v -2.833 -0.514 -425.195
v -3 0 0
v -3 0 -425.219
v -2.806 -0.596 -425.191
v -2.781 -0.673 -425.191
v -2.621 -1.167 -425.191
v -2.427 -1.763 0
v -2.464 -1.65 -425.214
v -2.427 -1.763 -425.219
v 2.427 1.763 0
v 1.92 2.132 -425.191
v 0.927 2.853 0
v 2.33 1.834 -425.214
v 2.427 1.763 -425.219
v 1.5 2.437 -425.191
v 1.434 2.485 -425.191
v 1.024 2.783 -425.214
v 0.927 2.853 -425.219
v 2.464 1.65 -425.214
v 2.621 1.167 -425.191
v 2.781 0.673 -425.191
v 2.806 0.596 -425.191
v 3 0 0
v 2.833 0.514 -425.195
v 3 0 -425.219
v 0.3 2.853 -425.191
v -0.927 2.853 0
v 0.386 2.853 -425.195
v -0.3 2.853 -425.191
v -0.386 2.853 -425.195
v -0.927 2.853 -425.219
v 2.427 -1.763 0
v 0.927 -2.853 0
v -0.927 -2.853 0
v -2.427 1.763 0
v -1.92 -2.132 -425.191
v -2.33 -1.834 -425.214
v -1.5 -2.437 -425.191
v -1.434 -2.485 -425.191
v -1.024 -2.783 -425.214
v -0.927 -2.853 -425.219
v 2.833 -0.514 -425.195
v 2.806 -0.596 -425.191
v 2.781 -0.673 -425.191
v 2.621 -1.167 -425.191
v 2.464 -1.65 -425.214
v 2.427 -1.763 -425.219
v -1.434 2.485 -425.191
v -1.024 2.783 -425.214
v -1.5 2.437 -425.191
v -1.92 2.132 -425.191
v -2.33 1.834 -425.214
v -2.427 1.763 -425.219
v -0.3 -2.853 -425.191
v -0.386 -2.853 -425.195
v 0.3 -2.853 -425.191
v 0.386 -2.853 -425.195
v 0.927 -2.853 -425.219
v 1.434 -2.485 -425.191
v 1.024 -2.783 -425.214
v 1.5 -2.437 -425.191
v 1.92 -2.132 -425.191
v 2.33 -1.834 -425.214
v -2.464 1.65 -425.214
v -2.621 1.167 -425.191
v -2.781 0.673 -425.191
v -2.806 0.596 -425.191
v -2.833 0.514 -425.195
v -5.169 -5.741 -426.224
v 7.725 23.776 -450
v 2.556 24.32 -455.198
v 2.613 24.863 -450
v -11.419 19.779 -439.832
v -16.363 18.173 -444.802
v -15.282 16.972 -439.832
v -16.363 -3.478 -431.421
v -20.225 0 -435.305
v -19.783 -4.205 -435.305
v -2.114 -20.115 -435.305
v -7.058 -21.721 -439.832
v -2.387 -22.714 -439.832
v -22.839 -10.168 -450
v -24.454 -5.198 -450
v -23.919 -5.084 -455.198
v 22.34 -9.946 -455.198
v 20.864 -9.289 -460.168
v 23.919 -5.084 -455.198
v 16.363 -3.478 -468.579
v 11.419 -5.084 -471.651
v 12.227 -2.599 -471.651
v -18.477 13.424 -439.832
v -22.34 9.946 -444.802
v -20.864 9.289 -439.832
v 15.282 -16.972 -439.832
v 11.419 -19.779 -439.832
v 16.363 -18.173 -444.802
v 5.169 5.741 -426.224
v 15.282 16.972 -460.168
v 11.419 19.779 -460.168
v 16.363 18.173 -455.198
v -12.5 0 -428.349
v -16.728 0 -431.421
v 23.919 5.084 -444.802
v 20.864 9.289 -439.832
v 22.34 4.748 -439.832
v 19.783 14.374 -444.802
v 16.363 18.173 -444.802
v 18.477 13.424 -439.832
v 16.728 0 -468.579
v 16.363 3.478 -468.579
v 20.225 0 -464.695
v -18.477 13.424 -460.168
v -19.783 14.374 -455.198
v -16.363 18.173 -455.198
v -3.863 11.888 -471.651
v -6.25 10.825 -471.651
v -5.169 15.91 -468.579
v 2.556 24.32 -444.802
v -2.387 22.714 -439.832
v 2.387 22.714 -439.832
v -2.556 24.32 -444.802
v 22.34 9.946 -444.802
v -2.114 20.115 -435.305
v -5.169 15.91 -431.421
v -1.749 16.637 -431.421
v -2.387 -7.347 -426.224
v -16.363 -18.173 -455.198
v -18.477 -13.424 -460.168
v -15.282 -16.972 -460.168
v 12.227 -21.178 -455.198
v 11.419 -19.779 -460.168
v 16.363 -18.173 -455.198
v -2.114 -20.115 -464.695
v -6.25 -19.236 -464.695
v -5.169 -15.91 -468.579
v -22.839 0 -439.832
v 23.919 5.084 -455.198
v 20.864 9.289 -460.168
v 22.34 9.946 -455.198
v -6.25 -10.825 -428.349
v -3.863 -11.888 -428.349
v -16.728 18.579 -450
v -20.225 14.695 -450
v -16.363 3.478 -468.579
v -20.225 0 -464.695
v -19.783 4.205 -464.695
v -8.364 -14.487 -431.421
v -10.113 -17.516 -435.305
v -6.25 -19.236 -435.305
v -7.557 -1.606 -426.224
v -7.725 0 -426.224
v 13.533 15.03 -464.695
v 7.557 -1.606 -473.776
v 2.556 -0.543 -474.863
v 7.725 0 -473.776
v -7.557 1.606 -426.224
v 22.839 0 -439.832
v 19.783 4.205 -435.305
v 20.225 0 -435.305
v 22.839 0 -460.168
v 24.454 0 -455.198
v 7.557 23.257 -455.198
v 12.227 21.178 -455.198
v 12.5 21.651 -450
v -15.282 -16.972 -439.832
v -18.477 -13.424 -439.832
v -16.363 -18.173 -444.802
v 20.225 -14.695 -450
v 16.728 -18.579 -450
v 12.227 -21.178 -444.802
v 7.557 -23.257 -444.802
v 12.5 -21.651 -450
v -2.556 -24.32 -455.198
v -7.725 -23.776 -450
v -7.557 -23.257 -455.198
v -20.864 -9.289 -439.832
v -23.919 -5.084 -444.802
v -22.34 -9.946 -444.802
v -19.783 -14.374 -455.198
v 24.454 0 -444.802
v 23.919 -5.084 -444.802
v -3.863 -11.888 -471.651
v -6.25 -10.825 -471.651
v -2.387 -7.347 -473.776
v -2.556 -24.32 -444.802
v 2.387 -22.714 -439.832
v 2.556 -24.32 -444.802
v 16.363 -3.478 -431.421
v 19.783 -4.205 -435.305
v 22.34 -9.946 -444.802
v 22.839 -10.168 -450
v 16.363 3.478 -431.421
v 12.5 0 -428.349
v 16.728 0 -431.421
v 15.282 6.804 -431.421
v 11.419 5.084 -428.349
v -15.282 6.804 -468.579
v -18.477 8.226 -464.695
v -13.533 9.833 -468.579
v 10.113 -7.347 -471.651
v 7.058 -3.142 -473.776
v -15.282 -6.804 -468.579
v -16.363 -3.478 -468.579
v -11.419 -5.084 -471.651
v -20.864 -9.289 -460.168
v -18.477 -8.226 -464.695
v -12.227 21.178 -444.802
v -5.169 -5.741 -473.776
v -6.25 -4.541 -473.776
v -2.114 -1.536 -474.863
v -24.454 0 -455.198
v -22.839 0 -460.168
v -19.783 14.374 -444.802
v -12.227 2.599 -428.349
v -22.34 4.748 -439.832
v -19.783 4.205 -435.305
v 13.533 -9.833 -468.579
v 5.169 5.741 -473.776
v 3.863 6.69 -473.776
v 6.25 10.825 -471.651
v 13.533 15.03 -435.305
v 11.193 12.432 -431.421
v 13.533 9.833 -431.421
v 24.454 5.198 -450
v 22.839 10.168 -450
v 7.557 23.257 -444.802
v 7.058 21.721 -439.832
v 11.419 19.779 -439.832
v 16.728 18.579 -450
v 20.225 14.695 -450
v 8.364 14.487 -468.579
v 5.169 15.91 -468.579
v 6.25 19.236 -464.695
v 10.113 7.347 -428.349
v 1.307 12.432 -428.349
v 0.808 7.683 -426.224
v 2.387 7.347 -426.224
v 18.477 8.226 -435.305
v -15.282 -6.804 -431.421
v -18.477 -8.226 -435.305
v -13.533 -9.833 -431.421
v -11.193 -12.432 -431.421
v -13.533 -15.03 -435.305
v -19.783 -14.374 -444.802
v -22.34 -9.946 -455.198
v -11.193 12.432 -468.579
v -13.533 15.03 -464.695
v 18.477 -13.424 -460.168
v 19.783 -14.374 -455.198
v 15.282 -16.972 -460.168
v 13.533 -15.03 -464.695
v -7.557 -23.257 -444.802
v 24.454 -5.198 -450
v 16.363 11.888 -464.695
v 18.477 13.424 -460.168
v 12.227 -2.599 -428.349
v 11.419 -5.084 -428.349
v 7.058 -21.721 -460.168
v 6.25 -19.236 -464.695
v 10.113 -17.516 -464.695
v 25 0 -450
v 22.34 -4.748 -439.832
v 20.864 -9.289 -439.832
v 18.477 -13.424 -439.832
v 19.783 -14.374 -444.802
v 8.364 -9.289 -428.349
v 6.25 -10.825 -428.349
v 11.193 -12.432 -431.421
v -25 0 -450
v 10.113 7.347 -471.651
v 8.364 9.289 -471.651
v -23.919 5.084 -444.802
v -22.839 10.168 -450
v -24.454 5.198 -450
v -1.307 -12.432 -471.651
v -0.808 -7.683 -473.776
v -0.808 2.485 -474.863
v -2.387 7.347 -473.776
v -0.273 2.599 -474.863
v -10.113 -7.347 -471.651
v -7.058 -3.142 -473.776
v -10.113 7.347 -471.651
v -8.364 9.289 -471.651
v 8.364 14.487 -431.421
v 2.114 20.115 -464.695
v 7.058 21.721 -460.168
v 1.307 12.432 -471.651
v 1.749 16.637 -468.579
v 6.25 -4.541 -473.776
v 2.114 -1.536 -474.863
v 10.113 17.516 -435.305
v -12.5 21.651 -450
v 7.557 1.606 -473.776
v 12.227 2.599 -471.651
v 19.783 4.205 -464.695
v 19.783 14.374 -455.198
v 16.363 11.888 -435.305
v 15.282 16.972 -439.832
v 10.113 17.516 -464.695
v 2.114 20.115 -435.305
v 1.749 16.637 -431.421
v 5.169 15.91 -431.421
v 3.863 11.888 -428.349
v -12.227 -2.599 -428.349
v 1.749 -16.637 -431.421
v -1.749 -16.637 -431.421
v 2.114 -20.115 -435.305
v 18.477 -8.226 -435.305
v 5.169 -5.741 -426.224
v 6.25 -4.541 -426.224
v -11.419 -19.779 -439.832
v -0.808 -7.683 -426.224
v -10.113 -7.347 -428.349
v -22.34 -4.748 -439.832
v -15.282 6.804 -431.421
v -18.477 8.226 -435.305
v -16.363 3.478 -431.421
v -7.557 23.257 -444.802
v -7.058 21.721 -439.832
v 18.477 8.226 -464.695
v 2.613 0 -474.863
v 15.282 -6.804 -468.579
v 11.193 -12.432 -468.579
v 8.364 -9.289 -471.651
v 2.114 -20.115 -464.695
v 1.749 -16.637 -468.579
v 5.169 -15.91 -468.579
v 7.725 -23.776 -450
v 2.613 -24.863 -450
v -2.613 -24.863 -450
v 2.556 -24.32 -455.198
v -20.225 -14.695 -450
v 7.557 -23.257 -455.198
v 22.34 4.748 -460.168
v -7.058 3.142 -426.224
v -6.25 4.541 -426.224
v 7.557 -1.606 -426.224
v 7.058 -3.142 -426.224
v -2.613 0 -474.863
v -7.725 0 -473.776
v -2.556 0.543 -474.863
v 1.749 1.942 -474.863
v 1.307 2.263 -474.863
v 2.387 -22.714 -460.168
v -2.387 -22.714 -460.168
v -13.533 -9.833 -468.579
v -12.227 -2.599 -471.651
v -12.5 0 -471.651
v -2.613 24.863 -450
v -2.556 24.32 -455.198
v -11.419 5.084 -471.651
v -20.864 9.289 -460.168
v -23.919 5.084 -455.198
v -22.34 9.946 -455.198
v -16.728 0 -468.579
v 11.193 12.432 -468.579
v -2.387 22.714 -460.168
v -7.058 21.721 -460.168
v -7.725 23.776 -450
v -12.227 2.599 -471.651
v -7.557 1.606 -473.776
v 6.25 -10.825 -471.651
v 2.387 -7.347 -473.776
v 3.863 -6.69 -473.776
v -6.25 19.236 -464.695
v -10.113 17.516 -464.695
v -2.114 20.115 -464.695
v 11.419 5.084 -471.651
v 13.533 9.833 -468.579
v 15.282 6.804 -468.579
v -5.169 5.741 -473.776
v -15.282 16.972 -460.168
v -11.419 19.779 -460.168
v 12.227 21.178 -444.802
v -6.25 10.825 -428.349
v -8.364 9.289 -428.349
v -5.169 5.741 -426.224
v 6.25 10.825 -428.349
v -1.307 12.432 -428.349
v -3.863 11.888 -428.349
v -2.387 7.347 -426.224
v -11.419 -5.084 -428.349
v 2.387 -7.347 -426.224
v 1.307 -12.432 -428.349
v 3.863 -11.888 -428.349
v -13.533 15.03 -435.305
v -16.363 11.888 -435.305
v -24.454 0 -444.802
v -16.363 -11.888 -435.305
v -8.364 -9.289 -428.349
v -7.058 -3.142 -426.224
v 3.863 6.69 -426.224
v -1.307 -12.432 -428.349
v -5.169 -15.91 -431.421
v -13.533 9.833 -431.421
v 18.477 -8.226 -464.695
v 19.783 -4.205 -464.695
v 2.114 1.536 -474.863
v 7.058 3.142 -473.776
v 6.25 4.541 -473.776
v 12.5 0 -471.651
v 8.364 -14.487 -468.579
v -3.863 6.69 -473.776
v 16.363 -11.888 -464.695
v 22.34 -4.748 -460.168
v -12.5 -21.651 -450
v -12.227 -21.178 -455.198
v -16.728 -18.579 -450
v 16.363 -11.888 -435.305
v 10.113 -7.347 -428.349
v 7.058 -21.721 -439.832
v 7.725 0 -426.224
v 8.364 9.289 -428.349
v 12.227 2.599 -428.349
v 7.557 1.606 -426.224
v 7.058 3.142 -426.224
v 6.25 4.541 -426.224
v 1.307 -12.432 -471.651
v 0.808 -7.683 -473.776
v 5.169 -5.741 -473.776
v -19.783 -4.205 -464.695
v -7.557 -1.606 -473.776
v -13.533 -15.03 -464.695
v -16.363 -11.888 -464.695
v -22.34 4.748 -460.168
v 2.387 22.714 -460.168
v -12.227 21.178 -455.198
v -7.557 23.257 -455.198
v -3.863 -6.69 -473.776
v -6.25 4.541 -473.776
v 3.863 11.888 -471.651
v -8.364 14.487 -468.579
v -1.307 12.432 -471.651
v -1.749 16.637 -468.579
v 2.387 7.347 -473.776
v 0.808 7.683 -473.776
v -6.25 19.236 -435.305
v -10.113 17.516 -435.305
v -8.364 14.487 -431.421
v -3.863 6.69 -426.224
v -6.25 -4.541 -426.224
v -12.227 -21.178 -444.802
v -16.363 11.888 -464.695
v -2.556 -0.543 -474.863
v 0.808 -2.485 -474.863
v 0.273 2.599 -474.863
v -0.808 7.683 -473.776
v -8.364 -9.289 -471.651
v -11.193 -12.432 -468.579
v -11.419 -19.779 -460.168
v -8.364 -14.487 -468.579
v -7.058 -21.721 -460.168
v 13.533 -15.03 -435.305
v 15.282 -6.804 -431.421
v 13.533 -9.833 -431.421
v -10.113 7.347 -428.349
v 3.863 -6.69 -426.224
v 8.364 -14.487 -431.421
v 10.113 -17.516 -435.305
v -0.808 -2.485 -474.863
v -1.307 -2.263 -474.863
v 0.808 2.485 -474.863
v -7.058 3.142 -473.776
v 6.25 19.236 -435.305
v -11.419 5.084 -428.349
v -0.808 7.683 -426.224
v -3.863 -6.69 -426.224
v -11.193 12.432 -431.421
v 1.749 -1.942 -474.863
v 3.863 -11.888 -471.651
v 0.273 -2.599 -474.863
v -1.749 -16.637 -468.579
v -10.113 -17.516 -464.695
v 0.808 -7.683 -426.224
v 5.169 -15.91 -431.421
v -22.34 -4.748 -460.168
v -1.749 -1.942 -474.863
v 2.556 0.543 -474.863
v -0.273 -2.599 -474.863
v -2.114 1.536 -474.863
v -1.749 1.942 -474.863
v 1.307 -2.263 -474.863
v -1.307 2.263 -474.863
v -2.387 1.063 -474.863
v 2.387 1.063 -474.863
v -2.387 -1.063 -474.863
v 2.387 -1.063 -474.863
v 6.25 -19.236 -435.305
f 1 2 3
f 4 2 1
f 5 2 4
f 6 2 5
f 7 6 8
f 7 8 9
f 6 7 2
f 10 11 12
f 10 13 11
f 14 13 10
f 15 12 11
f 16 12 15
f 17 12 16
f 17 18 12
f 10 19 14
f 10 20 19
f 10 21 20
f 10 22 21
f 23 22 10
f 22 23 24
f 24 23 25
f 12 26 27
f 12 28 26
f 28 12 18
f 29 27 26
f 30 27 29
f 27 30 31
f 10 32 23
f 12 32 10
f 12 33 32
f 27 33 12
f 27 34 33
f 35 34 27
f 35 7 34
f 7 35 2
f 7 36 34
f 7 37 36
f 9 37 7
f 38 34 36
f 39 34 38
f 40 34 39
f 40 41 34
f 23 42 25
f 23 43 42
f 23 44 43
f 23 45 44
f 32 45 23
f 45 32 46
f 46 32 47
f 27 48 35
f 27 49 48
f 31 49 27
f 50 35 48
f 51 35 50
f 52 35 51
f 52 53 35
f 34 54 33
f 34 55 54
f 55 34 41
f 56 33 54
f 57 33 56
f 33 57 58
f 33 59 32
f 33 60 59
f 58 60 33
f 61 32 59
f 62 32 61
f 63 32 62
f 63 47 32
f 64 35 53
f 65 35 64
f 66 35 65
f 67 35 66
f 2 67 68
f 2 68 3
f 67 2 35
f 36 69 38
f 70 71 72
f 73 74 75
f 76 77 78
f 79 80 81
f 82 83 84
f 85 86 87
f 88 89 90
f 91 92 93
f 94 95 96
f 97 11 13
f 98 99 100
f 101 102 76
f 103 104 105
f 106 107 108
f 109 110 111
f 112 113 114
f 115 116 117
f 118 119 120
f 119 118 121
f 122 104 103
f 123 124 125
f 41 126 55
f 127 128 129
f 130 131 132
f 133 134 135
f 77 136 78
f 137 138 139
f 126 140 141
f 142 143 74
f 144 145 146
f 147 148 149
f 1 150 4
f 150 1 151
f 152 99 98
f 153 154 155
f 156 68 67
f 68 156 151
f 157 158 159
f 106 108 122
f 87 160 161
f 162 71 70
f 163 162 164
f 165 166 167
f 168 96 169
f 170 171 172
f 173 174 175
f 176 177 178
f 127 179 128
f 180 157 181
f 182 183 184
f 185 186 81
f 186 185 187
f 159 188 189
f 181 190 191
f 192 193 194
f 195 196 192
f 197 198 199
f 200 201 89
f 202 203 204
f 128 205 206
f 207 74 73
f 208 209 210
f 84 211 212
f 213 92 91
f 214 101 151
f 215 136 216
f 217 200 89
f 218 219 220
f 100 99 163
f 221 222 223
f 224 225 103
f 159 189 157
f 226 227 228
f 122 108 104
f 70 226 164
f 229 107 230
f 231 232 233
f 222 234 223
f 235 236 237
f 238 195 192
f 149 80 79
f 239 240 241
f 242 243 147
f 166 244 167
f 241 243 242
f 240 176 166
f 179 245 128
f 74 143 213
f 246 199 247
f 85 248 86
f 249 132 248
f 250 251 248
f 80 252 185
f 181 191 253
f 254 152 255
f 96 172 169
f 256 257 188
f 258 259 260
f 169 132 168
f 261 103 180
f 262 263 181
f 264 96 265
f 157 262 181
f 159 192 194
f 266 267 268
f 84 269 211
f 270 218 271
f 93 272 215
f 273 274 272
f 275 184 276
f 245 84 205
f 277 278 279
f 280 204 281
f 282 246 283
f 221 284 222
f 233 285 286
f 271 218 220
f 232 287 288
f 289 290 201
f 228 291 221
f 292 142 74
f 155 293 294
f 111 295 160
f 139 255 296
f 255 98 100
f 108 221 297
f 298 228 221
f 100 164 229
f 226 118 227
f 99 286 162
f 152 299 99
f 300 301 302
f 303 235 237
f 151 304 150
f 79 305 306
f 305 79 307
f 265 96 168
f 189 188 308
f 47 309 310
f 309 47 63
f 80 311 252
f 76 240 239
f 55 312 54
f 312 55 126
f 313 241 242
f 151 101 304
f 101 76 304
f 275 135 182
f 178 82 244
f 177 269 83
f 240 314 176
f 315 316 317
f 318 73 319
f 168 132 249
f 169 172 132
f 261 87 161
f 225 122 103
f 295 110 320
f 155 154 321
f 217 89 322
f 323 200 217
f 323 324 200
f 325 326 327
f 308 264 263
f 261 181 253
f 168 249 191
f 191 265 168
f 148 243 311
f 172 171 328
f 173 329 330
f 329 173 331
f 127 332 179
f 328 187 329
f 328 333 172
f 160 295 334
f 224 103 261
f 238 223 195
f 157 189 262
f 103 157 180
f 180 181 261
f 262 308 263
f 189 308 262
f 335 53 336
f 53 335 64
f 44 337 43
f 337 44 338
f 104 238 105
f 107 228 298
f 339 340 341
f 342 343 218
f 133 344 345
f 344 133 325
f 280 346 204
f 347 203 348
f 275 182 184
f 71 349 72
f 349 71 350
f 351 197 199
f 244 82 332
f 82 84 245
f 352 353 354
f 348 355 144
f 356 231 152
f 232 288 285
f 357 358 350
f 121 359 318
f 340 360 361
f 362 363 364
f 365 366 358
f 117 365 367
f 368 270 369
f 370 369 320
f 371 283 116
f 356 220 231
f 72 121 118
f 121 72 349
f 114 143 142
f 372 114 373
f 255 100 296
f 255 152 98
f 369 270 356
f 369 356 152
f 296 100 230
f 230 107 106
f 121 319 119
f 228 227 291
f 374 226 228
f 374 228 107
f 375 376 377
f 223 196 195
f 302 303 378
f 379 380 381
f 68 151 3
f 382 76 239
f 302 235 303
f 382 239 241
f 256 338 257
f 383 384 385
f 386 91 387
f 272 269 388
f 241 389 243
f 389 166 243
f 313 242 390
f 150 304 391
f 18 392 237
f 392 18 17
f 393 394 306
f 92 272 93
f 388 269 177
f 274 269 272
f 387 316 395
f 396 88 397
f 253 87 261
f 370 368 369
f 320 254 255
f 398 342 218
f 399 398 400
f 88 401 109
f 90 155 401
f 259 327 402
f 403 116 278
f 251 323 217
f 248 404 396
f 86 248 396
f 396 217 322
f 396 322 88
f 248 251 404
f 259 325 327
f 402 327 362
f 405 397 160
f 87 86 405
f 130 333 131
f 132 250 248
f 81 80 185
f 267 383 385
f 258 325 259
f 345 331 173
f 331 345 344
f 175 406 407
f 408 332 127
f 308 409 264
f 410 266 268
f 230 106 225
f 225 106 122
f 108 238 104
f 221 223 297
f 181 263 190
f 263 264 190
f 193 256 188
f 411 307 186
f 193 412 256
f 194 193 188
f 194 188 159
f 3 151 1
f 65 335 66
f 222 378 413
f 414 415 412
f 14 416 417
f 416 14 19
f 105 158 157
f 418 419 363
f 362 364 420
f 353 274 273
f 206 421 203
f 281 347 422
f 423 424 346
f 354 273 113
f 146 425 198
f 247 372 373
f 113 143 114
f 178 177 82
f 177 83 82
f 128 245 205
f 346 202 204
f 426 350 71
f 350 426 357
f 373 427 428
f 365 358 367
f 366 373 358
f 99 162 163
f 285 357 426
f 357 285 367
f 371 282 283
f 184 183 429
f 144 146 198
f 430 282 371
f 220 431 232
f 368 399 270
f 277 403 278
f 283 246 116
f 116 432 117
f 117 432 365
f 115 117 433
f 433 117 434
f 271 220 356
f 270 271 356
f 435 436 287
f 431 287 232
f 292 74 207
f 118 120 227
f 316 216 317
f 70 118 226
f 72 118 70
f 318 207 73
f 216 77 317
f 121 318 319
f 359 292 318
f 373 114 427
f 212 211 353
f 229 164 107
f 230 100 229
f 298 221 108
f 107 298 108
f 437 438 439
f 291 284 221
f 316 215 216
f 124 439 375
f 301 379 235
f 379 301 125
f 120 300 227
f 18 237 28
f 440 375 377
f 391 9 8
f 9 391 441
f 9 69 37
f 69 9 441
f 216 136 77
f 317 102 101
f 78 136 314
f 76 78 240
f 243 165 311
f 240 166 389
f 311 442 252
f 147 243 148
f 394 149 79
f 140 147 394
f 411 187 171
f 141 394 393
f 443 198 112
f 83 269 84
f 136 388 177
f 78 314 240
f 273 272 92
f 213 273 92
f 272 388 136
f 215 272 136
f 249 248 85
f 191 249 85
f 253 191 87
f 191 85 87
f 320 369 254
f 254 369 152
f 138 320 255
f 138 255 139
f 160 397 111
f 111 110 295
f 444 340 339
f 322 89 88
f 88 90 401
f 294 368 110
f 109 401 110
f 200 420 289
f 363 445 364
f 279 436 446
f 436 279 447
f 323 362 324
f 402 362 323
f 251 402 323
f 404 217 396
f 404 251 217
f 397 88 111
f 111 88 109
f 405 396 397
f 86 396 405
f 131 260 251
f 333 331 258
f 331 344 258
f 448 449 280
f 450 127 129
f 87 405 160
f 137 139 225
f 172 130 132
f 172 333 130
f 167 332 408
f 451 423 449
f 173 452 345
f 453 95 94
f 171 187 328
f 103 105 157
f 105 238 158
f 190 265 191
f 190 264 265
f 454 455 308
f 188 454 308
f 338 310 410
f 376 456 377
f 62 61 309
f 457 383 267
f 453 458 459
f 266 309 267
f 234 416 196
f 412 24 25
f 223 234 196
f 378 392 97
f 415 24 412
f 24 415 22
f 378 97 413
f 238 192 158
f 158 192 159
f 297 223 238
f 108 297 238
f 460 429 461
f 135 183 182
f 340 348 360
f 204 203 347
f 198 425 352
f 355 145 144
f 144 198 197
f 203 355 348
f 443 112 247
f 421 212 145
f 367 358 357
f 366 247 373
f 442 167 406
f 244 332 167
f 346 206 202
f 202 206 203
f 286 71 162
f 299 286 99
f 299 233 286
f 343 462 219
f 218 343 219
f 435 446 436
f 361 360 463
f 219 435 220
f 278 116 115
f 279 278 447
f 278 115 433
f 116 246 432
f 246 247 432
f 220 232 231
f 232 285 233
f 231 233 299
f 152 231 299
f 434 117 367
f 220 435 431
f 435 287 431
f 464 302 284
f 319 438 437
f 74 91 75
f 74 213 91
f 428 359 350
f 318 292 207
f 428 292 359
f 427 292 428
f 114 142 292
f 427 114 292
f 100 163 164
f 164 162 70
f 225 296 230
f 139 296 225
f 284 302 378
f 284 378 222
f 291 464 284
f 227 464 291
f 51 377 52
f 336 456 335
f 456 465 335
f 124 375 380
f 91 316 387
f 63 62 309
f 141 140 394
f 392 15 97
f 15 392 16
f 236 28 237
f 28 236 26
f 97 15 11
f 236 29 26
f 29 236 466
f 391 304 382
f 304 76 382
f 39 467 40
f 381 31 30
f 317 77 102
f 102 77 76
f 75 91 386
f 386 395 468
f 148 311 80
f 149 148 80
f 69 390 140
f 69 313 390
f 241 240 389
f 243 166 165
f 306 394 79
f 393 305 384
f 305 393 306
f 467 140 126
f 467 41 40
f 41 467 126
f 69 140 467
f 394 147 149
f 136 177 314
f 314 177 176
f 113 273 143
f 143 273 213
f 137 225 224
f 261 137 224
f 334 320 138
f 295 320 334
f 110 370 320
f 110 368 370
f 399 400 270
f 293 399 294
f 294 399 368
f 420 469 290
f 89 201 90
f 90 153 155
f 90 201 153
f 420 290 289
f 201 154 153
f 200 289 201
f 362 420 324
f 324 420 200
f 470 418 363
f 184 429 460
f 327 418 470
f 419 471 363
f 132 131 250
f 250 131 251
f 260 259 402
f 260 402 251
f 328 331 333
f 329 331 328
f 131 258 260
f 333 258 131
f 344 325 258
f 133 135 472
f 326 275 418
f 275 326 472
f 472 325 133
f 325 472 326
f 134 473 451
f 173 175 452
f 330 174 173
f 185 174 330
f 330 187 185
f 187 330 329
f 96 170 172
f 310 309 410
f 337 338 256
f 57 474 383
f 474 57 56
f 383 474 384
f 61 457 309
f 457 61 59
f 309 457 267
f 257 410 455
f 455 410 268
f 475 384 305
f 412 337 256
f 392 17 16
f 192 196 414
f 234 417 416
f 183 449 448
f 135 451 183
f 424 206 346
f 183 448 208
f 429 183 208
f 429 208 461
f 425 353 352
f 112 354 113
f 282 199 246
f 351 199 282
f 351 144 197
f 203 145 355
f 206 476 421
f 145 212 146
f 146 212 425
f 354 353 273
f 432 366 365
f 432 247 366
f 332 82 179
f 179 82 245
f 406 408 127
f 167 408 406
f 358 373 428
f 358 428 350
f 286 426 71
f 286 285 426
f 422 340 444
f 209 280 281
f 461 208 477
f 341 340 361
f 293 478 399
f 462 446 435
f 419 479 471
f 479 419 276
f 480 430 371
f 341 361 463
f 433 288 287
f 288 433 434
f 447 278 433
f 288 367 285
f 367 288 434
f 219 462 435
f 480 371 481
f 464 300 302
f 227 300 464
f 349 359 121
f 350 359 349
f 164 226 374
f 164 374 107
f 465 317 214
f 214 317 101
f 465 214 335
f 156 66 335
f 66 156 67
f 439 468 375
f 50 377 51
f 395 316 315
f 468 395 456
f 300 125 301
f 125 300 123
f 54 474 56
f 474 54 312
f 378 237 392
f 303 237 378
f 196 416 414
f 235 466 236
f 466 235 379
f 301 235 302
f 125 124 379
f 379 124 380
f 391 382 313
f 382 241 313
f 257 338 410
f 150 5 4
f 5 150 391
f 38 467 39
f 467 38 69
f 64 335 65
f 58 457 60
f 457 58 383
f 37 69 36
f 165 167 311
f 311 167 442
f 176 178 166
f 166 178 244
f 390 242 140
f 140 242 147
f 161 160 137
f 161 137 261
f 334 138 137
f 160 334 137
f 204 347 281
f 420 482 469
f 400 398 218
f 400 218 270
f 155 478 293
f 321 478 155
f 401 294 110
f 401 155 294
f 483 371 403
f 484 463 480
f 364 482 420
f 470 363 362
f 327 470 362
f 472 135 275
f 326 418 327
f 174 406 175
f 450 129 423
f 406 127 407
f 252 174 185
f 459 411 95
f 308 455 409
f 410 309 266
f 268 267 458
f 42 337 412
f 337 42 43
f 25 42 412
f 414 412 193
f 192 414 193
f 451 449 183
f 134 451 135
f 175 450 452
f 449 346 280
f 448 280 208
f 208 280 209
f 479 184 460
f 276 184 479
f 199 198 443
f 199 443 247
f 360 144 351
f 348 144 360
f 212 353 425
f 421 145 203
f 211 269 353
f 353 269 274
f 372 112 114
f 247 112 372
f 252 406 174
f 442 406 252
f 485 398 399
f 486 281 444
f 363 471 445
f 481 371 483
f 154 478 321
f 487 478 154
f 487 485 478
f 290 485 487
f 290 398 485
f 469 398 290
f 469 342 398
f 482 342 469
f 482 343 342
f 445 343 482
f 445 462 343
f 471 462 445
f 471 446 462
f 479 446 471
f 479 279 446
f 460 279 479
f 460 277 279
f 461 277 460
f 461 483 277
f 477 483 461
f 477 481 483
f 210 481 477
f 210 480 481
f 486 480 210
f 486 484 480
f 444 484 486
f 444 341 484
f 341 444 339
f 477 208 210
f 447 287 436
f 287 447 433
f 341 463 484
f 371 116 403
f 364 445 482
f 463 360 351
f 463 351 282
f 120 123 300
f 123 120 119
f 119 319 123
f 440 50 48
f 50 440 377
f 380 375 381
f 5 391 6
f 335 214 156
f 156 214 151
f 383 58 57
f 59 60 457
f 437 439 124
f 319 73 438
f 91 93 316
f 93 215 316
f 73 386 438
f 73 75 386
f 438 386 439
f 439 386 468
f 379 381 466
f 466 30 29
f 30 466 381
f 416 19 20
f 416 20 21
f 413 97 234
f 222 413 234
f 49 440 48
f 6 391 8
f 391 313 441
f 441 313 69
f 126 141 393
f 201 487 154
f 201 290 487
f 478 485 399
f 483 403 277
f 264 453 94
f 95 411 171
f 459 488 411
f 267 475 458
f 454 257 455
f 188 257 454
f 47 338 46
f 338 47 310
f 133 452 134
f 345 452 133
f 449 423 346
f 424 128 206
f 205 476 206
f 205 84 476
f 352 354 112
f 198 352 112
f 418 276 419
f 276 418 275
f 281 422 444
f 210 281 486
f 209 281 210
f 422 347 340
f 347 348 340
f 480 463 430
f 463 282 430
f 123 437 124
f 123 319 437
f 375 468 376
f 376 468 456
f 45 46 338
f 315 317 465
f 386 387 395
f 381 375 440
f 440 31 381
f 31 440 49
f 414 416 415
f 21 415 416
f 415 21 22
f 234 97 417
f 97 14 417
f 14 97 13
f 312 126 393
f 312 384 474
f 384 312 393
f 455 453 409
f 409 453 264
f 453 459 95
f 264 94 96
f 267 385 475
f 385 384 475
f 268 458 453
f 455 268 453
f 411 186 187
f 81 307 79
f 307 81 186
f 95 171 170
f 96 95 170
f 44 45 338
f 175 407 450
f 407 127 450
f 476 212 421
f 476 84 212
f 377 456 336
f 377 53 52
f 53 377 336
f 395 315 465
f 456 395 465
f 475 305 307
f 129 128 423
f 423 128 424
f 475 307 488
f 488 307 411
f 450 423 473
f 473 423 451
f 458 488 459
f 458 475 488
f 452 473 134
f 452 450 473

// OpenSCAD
d = 450;
radio=25;

module pendulo(theta=0)
{
    rotate([theta,0,0])
        translate([0,0,-d]) {
            cylinder(h=d, r=3);
            sphere(radio);
        }
}

theta_max = 30;
theta = theta_max * sin(360*$t) * exp(-2*$t);
pendulo(theta);
